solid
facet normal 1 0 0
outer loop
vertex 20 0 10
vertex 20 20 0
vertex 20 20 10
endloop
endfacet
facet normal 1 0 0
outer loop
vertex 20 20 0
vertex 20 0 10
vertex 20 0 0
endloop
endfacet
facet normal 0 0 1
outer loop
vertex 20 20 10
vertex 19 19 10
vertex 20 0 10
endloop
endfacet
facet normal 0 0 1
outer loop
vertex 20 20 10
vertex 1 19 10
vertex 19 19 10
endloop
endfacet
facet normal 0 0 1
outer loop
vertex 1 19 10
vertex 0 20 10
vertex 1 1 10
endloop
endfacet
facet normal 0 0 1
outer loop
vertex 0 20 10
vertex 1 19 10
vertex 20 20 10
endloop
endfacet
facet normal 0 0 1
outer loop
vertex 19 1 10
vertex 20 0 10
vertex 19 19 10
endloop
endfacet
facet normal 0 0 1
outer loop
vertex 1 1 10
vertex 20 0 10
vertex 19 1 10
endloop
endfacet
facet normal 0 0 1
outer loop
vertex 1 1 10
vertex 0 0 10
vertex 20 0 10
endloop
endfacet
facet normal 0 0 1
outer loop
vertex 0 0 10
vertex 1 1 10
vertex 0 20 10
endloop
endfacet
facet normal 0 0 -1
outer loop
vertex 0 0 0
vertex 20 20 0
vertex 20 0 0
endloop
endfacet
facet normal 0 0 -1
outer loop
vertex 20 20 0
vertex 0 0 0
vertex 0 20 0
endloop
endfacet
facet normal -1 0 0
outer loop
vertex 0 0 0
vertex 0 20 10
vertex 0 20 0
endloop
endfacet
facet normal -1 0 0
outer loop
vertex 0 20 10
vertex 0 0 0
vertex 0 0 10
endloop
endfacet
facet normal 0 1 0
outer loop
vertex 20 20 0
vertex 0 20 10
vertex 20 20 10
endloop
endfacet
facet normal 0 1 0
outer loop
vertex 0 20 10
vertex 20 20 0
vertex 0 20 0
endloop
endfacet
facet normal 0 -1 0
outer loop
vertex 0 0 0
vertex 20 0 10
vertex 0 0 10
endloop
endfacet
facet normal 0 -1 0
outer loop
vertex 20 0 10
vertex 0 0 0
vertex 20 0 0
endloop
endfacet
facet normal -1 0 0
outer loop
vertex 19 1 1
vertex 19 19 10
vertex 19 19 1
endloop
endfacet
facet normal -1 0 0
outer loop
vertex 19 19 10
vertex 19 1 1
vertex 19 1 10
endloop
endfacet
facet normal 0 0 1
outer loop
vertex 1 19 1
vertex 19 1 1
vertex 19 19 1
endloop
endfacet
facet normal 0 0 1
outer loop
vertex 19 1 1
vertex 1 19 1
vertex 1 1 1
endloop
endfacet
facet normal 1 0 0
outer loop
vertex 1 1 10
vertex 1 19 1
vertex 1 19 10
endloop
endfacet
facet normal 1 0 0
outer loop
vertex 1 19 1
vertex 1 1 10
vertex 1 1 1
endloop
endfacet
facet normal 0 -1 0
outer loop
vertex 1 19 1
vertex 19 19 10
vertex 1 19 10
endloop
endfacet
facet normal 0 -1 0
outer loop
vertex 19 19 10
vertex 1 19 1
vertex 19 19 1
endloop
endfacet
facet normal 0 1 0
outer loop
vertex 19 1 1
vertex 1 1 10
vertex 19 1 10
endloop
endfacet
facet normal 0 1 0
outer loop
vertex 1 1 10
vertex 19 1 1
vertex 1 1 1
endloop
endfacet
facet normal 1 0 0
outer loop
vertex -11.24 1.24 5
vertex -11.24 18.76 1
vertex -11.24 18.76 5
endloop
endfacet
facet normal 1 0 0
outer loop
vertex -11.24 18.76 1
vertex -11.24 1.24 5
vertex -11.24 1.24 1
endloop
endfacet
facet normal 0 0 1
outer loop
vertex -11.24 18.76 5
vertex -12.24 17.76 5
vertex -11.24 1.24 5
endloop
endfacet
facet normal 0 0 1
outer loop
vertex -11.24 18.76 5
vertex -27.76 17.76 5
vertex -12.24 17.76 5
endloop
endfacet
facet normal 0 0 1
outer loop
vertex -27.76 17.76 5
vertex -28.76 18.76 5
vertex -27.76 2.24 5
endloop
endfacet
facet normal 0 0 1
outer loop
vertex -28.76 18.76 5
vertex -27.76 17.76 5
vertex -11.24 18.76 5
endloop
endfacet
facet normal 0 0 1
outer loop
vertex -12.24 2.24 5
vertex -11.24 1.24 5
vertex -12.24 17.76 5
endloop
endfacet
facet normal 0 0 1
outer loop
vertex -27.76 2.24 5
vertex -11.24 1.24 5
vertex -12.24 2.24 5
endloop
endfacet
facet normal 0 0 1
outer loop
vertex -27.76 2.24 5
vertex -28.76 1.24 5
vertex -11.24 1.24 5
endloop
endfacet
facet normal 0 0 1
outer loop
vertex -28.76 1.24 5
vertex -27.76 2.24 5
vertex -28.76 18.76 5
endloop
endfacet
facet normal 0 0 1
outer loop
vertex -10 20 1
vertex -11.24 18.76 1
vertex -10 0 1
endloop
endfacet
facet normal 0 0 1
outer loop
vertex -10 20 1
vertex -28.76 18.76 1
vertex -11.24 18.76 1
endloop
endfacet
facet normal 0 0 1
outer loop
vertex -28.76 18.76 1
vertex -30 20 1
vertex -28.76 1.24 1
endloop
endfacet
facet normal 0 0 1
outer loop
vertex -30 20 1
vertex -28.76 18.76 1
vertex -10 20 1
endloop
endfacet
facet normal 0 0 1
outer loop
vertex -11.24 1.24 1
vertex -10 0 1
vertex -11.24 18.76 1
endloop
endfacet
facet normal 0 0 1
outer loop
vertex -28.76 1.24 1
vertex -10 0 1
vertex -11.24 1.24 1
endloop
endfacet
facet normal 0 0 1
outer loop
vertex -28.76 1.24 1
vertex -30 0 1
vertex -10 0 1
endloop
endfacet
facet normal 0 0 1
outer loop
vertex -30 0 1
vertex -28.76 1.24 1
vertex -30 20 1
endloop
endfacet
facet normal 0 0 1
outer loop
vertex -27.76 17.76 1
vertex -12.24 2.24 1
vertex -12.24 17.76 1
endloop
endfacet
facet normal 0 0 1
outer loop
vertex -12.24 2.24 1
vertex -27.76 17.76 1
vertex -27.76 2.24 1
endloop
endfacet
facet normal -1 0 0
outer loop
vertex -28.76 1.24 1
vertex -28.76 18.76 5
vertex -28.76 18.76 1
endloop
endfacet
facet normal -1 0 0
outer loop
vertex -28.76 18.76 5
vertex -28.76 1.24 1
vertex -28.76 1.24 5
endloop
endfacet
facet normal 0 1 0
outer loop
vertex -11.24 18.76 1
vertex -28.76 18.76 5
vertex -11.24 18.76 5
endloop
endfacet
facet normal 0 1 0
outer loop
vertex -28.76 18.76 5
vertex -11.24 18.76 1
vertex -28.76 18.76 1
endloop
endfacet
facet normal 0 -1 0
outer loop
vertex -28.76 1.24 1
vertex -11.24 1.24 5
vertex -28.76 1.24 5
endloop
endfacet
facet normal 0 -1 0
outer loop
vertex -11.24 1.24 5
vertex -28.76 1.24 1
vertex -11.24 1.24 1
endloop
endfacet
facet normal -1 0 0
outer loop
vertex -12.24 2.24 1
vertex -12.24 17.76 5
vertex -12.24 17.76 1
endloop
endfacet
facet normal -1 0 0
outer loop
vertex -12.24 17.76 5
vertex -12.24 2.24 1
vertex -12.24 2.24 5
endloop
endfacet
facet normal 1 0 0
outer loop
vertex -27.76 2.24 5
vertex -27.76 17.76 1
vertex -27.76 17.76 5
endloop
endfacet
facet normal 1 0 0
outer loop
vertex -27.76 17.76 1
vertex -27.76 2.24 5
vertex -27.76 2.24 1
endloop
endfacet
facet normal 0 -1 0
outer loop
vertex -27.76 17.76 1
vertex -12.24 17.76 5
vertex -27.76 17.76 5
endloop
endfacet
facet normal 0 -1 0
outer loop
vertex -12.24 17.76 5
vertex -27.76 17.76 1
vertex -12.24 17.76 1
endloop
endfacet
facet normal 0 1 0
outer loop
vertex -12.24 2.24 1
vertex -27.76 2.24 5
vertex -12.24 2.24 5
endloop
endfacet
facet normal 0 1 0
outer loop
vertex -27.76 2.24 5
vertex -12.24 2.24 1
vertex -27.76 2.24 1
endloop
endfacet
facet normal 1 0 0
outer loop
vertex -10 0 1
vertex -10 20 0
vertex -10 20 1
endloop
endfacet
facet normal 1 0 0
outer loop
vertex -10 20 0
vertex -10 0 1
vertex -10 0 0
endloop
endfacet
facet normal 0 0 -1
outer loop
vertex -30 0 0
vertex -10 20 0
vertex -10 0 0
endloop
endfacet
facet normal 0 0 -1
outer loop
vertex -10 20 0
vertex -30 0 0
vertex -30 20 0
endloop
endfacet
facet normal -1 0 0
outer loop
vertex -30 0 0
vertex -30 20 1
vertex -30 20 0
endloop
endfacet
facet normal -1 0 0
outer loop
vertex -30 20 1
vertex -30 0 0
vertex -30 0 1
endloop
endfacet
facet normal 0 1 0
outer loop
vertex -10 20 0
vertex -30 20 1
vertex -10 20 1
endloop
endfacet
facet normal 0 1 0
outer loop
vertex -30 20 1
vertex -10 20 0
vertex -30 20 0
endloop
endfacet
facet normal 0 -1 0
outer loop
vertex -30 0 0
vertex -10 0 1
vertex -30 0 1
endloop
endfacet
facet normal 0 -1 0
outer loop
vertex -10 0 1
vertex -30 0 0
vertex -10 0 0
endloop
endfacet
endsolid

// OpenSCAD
// [FL_INDEX: keywords="openscad, 3d_parametric, Another_Customizable_Box, csg_solid" | COT="Parametric OpenSCAD design from 3DCodeverse"]
// Title: Another Customizable Box

// Customizable box with lid
// by Hari Wiguna, Oct 2013

// Box Width (mm)
boxX = 20;

// Box Depth (mm)
boxY = 20;

// Box Height (mm)
boxZ = 10;

// Wall Thickness (mm)
wallT = 1;

// Lid lip height (mm)
lidZ = 5;

// (mm. Smaller number means tighter fit)
lidClearance = 0.24;

// Choose No if you're just tweaking the lid clearance
printBox = 1; // [1:Yes,0:No]

printLid = 1; // [1:Yes,0:No]

t2 = wallT * 2;
t4 = wallT * 4;

// Generate Box & Lid
union()
{
	Box();
	translate([-boxX-10,0,0]) Lid();
}

module Box()
{
	if (printBox==1)
	difference()
	{
		// Outer box
		cube([boxX, boxY, boxZ]);

		// Subtract inner void
		translate([wallT, wallT, wallT])
			cube([boxX-t2,boxY-t2,boxZ]);
	}
}

module Lid()
{
	if (printLid==1)
	union()
	{
		cube([boxX, boxY, wallT]);
		LidInset(boxX, boxY, lidZ);
	}
}

module LidInset(x,y,z)
{
	f = lidClearance;
	translate([wallT+f, wallT+f, wallT])
	difference()
	{
		cube([x-2*(wallT+f), y-2*(wallT+f), z-wallT]);

		translate([wallT,wallT,0])
			cube([x-t4-(2*f), y-t4-(2*f), z]);
	}
}
